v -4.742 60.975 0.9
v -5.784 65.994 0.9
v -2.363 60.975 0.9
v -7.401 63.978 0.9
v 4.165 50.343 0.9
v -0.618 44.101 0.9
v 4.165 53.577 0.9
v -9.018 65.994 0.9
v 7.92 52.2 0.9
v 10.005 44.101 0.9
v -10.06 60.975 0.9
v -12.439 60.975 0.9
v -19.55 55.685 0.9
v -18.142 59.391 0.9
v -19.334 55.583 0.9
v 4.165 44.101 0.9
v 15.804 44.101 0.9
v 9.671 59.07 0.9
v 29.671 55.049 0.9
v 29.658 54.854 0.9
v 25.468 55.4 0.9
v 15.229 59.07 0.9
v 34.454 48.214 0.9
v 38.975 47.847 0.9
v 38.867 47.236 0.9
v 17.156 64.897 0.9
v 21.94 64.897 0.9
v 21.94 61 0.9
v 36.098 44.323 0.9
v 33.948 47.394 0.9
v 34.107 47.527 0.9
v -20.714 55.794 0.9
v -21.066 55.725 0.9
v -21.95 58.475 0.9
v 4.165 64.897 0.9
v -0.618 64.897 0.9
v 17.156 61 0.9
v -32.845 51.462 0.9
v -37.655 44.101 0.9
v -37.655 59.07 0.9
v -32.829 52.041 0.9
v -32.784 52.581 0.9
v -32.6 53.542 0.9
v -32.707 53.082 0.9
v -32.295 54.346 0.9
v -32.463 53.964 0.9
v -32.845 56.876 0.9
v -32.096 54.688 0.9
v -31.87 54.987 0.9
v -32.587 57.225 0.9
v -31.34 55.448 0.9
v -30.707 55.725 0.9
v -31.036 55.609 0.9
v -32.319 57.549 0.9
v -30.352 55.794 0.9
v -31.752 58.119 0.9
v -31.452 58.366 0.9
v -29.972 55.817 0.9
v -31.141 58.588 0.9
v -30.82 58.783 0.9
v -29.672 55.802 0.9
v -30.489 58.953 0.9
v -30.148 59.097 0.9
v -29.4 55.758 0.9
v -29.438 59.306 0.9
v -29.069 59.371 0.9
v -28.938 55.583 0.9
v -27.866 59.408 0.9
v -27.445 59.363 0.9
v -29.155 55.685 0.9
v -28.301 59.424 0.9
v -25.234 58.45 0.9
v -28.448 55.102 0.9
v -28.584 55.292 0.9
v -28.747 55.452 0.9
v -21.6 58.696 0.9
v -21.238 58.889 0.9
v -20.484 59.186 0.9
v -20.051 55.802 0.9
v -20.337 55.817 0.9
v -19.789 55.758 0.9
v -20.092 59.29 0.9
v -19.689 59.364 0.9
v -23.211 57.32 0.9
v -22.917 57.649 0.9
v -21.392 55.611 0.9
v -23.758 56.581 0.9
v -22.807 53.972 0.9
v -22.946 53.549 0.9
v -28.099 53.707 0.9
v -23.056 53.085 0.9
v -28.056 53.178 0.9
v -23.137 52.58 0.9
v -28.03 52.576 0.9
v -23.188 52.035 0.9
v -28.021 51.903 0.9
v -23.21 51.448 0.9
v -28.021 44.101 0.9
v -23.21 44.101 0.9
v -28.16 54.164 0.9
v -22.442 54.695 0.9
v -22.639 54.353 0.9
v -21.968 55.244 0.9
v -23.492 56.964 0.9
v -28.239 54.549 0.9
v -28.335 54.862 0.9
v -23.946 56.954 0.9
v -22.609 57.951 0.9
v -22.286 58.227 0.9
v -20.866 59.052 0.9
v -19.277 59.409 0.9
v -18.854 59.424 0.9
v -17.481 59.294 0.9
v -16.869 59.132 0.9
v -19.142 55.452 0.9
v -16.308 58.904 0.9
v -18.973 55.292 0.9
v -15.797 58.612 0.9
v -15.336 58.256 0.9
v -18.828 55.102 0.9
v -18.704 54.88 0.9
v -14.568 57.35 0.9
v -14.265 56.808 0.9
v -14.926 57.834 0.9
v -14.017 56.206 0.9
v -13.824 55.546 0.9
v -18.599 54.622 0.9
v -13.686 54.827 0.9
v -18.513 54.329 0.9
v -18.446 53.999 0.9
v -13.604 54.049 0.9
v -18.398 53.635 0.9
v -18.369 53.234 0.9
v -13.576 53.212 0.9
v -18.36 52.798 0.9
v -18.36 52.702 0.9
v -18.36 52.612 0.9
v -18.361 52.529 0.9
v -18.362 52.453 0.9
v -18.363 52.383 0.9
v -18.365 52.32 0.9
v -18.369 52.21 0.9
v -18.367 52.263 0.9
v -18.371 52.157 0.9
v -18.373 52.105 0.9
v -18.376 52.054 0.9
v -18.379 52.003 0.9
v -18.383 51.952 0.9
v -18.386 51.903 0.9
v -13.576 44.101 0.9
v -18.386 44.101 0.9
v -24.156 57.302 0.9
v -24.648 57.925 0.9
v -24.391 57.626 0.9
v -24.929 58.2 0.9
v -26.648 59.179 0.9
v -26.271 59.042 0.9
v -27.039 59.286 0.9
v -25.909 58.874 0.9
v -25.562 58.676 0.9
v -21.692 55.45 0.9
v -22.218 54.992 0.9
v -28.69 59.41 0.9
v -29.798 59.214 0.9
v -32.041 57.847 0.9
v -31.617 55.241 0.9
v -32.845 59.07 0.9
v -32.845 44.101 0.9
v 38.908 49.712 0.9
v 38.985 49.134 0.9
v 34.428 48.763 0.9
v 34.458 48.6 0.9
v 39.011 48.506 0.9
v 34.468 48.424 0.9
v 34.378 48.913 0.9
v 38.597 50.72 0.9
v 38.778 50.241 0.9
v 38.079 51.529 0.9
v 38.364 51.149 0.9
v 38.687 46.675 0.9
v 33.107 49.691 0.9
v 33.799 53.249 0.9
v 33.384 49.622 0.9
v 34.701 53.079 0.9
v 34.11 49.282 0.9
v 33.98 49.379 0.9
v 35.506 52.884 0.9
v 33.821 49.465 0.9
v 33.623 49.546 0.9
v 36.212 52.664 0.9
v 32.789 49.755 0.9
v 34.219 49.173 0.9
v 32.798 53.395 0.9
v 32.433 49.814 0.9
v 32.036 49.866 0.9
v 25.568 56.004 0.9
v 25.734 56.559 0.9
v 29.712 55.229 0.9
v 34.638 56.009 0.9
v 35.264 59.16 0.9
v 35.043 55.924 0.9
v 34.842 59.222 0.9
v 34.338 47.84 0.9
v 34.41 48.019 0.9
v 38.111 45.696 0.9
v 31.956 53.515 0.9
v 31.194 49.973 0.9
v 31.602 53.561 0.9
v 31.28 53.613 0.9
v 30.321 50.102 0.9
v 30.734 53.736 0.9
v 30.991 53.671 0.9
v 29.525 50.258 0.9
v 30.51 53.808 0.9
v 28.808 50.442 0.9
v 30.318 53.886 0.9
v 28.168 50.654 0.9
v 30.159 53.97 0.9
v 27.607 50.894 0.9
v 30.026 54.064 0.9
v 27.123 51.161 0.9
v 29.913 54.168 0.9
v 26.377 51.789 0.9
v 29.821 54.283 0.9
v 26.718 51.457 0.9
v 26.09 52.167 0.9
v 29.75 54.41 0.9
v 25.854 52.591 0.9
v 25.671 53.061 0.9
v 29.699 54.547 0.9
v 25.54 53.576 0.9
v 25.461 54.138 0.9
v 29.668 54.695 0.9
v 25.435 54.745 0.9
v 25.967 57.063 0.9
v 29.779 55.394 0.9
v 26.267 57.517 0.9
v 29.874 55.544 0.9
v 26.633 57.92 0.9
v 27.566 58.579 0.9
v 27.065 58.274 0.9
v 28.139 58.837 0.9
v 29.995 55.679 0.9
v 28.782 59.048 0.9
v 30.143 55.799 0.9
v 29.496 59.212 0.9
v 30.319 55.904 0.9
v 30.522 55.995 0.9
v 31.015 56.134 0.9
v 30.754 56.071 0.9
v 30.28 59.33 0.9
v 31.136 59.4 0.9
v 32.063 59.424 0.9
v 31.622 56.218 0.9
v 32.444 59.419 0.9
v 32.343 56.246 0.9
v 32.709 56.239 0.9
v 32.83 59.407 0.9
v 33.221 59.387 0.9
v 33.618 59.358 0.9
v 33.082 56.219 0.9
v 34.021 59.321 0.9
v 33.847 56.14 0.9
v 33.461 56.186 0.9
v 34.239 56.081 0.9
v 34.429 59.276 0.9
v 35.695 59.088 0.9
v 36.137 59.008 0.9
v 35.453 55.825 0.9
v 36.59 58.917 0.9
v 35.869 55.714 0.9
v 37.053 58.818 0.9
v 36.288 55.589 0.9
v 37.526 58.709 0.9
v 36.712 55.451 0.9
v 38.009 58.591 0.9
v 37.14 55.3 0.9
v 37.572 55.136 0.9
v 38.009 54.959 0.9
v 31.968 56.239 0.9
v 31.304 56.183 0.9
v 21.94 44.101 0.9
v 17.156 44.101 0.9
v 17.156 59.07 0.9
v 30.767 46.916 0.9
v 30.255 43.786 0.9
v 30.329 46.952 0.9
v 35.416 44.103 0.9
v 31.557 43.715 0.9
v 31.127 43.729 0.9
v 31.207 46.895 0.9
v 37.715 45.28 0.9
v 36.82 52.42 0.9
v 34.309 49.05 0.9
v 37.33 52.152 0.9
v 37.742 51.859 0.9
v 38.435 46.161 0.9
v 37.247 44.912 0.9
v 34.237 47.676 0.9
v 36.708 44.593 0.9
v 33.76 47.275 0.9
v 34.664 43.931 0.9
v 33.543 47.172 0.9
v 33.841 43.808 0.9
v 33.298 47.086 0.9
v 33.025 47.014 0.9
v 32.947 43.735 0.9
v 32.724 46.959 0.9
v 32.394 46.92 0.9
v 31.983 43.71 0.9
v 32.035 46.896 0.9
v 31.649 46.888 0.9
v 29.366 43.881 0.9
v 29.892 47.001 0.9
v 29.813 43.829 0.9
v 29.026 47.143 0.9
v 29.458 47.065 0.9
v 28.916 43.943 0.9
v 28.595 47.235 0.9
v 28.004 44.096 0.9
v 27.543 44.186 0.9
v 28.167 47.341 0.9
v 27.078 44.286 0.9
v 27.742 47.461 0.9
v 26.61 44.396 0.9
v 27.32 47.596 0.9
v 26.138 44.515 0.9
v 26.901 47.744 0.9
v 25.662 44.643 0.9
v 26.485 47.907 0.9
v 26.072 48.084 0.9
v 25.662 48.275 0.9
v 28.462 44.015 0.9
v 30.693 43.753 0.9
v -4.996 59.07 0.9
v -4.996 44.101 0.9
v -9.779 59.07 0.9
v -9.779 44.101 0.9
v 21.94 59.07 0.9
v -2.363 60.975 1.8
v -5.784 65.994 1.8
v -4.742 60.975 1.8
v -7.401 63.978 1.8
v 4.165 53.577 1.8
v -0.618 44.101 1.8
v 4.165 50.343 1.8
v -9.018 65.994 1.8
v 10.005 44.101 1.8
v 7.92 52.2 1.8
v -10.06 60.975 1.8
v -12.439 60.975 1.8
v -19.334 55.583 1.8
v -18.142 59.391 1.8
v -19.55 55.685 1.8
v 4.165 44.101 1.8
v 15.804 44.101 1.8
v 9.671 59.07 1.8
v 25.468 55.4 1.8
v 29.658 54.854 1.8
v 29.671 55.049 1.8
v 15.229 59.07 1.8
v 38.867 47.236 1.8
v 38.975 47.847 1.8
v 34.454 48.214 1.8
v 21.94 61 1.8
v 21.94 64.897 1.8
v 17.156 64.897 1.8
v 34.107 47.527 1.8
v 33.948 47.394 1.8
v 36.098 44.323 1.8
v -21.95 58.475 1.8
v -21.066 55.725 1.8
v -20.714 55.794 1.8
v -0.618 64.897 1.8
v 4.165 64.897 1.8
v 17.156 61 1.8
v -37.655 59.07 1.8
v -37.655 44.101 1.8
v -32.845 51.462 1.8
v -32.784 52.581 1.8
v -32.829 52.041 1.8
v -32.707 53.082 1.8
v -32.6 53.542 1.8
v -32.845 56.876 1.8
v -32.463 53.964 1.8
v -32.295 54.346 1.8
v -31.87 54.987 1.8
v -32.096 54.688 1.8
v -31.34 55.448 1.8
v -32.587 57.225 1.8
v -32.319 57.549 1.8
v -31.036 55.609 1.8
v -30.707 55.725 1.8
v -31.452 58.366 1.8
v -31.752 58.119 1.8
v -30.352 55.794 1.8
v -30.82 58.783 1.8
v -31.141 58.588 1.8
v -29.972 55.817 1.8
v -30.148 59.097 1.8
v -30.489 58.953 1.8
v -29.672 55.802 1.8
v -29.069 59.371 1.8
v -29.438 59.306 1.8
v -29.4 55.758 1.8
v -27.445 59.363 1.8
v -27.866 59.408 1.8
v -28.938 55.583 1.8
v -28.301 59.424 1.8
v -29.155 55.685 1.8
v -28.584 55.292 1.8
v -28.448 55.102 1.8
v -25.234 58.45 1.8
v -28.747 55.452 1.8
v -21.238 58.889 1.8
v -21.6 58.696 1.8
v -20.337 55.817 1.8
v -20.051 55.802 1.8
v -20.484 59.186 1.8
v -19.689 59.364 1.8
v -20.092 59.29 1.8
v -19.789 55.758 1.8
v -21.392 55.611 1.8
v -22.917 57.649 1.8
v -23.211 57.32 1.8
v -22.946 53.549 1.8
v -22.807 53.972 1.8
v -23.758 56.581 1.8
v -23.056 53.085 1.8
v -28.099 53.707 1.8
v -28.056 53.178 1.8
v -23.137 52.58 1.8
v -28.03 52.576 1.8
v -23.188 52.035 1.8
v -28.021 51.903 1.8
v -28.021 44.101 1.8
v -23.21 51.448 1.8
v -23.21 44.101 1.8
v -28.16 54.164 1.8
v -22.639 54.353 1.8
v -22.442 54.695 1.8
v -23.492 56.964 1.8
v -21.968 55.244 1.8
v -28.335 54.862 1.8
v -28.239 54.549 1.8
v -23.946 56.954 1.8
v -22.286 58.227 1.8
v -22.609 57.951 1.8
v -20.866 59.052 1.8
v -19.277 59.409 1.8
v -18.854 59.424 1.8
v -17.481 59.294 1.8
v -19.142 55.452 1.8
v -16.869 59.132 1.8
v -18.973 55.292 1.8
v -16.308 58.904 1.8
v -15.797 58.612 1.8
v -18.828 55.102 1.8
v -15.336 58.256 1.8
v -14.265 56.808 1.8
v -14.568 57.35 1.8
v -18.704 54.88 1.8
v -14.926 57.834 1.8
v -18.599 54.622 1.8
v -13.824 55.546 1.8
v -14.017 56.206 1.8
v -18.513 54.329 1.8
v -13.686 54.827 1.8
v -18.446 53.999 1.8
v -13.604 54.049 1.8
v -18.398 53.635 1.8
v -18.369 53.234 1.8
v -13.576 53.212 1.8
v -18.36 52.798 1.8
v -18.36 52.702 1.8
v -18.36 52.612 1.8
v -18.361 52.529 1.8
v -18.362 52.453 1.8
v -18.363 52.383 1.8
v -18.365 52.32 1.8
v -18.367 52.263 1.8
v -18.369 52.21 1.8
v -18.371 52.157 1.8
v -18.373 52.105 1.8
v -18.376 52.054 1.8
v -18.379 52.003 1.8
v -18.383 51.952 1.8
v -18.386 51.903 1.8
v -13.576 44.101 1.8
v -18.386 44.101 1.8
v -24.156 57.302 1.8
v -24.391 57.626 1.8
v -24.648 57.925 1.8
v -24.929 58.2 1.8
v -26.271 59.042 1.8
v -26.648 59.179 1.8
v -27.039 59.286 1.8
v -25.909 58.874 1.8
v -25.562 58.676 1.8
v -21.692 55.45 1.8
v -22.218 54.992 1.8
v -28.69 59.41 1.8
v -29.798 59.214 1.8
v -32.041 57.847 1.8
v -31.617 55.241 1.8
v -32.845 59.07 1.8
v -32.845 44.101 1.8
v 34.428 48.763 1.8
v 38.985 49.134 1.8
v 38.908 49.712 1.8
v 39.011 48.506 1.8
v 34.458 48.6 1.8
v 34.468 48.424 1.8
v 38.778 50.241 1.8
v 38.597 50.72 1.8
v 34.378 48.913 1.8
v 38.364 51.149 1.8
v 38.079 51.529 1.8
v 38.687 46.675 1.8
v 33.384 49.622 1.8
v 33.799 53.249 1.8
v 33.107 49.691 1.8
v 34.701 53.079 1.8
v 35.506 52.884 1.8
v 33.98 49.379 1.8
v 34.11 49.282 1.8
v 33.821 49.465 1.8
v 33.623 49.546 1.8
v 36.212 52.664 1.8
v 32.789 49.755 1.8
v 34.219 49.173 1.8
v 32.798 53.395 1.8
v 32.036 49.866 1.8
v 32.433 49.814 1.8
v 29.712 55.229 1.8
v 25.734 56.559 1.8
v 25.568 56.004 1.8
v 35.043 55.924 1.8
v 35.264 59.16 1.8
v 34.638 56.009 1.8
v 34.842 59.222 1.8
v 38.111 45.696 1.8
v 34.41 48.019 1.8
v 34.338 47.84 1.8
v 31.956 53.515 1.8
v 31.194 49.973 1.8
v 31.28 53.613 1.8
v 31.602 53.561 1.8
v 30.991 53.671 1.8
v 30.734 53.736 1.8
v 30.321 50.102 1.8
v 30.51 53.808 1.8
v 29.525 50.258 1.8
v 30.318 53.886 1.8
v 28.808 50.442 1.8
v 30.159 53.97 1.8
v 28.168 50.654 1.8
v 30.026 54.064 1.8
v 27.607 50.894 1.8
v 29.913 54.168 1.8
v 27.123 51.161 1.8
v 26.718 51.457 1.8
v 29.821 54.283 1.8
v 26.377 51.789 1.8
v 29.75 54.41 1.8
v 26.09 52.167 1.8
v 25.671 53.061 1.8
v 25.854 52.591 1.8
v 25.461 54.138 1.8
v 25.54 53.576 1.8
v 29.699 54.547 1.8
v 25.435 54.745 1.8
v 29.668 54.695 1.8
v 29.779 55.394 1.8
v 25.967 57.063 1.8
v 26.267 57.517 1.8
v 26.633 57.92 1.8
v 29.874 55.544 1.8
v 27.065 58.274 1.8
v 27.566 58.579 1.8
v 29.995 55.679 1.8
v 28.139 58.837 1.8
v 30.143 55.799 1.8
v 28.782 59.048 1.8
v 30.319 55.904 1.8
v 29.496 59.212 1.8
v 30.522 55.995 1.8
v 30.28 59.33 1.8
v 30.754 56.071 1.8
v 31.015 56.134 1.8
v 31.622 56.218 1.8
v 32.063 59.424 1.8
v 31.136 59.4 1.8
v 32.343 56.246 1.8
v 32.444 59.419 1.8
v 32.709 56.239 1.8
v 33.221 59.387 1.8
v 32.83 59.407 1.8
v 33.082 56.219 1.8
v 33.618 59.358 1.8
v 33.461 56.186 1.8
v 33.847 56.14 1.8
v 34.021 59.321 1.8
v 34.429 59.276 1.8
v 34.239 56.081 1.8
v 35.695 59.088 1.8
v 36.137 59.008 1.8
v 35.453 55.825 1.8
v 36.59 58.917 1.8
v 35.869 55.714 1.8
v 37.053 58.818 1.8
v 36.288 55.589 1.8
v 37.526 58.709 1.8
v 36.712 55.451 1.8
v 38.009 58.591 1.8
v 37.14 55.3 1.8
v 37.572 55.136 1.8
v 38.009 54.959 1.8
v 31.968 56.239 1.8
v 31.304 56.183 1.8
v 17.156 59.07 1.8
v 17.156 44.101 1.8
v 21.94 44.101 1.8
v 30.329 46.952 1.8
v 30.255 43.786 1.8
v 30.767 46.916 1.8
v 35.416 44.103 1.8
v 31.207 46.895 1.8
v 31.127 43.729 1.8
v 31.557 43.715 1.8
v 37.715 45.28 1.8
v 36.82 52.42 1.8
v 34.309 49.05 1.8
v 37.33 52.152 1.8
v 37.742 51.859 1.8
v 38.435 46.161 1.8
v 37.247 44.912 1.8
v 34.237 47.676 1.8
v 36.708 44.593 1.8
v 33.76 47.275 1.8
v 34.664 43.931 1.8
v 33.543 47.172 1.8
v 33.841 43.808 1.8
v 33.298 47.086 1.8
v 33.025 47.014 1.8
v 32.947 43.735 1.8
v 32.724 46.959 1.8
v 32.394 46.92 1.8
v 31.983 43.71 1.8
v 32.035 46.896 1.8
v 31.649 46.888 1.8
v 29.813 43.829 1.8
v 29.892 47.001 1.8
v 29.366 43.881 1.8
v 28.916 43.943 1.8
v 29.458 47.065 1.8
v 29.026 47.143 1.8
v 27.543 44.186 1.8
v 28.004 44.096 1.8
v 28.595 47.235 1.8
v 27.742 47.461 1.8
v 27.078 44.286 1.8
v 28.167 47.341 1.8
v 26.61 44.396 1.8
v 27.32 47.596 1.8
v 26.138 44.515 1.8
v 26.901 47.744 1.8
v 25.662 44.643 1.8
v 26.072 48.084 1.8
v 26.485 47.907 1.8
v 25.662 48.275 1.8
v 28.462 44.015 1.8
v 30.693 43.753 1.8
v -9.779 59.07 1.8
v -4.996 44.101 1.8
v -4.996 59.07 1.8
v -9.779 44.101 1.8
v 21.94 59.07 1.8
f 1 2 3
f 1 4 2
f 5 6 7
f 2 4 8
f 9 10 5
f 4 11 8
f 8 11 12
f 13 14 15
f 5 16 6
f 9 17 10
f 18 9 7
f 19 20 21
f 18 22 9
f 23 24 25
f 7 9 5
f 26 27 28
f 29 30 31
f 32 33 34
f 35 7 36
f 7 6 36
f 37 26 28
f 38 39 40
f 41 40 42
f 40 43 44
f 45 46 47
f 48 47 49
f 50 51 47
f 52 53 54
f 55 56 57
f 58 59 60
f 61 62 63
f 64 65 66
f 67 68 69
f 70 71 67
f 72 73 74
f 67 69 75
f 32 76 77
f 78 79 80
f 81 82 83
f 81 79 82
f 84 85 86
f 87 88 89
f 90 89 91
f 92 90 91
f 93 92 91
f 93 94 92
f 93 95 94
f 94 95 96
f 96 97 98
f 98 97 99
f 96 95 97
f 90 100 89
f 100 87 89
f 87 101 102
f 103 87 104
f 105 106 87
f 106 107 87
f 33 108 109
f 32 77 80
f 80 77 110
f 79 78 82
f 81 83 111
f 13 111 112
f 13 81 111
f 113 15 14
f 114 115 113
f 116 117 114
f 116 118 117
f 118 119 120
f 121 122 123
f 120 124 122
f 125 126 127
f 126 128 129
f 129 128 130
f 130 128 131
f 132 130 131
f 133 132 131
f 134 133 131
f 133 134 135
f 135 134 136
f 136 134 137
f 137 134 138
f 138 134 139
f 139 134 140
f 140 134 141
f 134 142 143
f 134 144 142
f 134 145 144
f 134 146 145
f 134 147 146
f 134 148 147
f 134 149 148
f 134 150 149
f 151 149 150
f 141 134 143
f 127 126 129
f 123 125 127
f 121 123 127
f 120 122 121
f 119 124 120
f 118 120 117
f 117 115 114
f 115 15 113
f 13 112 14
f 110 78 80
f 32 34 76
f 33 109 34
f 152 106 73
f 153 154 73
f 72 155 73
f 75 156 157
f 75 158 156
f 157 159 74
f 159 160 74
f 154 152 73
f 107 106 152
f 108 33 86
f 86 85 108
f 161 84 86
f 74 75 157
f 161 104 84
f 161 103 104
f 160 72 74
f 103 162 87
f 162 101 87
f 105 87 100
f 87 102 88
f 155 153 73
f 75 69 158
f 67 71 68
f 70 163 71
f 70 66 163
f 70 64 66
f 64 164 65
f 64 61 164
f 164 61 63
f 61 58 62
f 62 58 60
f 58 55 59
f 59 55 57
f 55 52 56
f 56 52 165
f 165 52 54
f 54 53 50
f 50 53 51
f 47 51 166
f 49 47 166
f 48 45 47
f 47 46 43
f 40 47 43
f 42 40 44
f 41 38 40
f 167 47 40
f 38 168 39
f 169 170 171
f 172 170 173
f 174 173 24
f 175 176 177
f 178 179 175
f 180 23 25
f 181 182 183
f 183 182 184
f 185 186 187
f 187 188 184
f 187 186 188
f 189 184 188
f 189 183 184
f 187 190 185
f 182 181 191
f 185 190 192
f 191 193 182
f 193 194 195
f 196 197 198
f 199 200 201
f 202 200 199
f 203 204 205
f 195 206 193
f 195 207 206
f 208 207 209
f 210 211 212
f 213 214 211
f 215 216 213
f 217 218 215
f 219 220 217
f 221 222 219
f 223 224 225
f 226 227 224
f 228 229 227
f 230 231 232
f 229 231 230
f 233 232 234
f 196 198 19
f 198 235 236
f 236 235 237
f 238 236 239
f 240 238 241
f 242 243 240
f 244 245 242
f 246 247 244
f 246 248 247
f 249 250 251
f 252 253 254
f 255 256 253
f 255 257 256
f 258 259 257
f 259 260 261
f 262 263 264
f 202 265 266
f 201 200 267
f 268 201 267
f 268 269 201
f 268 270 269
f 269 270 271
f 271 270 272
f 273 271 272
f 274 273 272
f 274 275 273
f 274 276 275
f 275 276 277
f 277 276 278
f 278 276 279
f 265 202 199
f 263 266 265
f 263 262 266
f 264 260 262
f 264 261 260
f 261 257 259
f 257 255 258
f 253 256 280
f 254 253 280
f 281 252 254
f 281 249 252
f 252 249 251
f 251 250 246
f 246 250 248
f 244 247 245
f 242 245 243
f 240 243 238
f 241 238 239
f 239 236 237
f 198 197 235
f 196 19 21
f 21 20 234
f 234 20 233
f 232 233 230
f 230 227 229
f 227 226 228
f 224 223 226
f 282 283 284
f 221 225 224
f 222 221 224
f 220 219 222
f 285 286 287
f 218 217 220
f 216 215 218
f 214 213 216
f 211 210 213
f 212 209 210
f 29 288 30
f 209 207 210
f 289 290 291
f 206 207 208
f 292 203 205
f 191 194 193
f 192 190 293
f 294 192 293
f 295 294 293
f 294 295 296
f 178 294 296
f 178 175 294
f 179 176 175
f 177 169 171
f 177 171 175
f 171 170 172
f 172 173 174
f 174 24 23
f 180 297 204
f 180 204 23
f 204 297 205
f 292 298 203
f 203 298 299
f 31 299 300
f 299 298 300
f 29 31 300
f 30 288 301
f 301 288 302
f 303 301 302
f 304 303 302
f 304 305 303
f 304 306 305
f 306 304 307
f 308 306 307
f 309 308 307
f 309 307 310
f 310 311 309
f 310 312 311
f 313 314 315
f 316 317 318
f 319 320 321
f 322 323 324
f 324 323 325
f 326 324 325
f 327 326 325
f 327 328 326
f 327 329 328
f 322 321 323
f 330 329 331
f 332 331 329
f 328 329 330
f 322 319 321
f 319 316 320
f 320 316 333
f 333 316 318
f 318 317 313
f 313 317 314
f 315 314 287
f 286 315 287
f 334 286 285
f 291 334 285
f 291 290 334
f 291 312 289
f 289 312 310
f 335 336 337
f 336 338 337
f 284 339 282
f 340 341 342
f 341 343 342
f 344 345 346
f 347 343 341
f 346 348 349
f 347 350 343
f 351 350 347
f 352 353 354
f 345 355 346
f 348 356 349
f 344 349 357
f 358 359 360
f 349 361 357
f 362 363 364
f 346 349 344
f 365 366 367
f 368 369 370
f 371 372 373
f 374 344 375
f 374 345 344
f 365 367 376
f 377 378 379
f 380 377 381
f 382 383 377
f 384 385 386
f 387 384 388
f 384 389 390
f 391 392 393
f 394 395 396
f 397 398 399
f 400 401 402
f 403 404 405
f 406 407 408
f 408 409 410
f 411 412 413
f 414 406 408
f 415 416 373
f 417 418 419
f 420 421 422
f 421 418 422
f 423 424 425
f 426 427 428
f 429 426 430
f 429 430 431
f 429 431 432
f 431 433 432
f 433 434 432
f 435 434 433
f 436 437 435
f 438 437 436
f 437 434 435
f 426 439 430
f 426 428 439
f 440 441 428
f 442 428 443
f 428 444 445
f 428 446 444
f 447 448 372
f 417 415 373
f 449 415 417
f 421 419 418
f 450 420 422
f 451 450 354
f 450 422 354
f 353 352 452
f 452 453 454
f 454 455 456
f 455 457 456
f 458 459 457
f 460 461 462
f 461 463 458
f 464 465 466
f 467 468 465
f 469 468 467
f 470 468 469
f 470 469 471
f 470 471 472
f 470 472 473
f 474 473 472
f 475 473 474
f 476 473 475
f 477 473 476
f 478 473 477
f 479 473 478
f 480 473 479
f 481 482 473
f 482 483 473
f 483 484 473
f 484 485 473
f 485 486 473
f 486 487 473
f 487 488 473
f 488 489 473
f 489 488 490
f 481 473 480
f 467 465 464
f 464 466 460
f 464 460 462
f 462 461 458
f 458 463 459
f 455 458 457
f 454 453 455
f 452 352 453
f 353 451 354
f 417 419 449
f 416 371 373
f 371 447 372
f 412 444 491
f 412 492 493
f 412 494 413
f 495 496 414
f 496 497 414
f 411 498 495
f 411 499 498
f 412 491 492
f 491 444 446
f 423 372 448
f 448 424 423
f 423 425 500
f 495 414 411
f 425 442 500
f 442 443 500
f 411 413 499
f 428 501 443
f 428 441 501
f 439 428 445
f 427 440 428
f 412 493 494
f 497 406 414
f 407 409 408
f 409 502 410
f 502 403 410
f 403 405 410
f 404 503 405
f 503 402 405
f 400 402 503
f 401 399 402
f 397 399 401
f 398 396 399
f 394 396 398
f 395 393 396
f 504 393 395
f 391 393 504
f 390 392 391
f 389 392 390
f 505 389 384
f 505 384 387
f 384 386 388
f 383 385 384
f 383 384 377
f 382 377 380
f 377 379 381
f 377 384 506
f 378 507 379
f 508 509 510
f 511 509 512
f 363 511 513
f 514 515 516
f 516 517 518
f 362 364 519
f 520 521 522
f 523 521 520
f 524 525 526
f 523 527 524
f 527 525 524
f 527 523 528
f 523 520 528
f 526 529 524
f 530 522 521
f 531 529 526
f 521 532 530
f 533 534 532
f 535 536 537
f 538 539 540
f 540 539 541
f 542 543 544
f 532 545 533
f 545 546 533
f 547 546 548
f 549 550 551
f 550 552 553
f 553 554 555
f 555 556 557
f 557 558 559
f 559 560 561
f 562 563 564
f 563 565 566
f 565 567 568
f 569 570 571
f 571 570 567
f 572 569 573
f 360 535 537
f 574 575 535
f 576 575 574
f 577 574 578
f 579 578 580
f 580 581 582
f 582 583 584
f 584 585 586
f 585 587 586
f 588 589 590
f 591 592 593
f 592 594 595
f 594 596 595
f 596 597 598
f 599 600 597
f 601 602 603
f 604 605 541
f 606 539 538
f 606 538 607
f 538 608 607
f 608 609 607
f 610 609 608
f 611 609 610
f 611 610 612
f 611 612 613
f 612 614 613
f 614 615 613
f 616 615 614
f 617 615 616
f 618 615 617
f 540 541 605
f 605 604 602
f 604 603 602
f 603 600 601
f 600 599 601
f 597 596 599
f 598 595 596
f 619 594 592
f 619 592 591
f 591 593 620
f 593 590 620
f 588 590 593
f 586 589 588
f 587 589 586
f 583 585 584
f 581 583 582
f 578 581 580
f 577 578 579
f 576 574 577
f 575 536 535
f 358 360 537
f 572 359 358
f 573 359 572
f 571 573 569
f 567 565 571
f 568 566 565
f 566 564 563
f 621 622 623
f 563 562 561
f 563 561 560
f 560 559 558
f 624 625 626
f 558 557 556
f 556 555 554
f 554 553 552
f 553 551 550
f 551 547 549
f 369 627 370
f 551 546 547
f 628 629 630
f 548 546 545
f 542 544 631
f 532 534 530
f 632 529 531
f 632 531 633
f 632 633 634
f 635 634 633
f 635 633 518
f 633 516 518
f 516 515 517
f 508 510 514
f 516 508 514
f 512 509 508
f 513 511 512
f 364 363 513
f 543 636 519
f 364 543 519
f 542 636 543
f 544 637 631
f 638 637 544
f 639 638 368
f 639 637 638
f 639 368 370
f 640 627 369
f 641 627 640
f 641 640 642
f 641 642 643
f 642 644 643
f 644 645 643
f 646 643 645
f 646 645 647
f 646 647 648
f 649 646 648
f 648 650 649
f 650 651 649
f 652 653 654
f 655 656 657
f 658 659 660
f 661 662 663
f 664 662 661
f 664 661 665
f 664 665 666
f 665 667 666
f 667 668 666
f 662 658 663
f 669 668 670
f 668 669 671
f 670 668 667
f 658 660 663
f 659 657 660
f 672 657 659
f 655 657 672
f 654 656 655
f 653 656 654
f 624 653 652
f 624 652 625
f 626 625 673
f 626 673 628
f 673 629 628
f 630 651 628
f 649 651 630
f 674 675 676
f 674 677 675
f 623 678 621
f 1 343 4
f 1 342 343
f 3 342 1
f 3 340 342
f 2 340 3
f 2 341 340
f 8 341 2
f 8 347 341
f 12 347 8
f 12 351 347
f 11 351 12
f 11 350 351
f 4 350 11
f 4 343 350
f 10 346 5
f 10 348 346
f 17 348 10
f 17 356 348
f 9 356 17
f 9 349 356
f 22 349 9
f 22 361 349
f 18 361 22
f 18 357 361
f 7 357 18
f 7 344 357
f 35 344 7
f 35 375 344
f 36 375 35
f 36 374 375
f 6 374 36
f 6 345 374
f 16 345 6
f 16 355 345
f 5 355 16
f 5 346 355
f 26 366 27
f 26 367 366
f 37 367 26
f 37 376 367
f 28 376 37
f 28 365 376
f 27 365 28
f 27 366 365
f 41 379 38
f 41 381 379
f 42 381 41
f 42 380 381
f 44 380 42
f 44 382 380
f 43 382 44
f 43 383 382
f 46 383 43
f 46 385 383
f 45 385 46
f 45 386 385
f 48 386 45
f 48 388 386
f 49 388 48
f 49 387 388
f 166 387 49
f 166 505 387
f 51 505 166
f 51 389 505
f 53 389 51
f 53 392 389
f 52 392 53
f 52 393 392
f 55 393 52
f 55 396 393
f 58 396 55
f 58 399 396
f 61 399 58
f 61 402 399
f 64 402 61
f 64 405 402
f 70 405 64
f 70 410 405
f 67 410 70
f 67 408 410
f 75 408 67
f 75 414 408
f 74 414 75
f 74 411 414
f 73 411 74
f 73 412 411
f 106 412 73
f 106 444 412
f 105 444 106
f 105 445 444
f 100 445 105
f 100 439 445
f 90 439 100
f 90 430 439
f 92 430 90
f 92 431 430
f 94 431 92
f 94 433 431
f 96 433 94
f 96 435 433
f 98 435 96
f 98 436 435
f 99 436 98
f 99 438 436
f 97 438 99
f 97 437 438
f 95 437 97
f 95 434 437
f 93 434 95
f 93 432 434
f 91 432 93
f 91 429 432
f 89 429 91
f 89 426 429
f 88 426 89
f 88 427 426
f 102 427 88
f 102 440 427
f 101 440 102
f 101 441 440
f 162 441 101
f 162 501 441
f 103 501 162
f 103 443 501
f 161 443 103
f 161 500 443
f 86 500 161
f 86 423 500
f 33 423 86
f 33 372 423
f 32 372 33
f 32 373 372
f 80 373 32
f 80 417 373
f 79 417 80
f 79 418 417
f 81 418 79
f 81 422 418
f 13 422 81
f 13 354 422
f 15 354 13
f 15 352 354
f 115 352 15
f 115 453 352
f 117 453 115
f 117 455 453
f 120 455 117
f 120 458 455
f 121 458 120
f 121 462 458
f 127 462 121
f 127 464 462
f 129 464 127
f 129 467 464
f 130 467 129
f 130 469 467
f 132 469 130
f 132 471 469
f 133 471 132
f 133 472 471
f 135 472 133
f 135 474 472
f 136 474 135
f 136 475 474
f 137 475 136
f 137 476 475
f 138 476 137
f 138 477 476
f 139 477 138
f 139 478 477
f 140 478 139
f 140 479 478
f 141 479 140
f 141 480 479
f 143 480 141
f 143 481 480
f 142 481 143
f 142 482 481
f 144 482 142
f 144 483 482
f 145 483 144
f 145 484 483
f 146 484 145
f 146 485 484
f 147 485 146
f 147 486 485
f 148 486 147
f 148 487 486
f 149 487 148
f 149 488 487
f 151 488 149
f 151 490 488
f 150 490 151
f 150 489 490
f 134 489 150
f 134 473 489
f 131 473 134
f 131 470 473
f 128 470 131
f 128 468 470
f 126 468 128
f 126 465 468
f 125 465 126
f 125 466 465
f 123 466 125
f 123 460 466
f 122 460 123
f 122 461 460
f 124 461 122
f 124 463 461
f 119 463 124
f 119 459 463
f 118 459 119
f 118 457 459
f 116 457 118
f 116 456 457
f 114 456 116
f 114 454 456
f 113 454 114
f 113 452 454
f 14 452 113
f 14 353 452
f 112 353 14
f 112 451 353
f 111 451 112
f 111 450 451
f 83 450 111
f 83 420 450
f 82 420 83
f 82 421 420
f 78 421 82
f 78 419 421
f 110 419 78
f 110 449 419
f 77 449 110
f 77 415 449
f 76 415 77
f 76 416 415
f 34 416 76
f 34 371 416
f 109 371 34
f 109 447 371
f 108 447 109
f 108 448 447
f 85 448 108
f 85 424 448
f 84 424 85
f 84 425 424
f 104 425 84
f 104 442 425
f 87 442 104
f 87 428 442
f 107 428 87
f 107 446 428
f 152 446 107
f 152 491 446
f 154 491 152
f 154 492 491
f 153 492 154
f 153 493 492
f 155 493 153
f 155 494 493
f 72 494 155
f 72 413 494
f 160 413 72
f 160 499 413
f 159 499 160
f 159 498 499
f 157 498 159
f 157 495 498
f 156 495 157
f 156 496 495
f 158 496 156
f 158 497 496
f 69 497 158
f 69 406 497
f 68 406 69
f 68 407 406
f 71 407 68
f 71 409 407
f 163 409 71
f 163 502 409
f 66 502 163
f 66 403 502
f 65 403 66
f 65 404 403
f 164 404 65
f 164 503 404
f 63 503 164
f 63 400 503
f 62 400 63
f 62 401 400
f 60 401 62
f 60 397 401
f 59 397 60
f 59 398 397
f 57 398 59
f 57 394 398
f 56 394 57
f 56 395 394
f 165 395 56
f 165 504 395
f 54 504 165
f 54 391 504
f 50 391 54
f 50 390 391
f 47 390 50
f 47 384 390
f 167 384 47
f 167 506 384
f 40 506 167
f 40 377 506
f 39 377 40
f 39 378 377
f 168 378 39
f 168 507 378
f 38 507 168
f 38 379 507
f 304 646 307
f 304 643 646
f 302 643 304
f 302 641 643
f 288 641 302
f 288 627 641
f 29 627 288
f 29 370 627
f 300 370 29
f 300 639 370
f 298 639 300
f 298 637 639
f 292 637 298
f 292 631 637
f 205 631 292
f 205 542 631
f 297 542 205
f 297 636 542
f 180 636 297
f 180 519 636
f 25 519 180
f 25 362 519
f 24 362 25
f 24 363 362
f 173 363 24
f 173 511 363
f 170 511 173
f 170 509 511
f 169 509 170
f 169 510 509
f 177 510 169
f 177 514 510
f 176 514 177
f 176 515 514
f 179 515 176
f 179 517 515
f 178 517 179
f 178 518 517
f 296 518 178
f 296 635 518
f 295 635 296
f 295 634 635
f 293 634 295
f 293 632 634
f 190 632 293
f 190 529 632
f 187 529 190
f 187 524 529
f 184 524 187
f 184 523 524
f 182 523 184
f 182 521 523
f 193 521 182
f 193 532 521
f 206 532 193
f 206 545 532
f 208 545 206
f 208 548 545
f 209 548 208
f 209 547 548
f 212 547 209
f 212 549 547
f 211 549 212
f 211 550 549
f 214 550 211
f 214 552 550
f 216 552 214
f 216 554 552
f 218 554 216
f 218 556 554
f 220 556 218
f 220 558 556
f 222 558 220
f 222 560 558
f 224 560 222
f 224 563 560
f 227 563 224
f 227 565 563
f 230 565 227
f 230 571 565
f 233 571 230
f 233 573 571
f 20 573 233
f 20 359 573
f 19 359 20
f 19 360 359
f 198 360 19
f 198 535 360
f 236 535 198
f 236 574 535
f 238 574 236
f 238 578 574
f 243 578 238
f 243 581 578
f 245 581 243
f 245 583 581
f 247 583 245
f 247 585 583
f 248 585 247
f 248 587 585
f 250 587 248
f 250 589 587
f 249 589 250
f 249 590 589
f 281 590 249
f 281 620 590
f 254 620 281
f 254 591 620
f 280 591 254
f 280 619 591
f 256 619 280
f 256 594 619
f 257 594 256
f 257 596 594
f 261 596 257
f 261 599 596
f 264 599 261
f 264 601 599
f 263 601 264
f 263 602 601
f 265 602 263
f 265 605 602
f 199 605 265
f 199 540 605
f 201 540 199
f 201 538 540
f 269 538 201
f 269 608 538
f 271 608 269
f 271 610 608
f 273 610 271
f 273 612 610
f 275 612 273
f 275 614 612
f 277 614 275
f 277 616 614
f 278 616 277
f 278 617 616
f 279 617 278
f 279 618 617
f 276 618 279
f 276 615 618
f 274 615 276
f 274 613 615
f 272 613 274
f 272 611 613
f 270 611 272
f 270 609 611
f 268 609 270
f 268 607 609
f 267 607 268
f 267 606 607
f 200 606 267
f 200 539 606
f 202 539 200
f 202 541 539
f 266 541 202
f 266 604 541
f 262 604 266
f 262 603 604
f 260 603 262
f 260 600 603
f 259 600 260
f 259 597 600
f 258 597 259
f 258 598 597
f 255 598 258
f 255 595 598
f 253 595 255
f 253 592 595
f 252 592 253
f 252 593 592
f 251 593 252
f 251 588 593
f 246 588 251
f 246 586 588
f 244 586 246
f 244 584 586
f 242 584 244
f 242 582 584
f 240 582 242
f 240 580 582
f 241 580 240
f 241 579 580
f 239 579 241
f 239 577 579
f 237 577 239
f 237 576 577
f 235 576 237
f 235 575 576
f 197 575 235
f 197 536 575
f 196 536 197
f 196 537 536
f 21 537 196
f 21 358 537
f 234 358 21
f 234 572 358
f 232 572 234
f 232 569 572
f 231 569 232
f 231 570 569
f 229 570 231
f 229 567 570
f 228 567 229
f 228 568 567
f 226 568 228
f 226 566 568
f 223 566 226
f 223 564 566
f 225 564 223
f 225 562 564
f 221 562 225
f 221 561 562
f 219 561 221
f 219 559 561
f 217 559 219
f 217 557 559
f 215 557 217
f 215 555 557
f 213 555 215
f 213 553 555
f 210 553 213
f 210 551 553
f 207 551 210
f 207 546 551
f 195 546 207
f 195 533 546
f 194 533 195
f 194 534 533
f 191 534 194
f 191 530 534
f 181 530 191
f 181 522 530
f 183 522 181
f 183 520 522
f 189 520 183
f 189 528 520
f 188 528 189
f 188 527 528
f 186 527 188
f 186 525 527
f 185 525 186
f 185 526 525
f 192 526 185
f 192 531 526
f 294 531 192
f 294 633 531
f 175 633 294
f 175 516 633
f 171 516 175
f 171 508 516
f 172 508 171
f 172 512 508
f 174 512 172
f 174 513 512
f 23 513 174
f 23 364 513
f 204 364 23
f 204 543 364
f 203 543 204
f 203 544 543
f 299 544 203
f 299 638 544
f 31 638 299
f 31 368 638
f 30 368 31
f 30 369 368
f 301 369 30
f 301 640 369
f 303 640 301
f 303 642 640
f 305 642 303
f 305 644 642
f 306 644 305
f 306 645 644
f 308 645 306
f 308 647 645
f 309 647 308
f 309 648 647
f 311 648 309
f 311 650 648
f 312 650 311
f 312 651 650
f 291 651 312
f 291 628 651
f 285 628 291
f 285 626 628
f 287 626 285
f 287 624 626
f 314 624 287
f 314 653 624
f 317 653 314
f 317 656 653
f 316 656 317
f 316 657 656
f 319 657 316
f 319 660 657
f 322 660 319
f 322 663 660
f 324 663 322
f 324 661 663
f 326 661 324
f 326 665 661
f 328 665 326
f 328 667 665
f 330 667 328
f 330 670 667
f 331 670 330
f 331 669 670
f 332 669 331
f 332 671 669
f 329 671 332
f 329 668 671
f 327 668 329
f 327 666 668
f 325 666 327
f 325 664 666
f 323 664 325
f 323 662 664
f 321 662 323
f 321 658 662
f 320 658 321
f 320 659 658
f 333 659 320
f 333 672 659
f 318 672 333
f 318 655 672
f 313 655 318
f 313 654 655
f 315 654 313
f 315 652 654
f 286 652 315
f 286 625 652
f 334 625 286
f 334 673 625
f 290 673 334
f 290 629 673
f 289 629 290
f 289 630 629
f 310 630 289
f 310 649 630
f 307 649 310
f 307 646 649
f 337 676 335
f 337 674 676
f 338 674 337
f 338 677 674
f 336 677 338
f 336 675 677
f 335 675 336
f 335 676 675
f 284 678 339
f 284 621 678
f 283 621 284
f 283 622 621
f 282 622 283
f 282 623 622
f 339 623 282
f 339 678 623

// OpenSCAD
$fn = 48;
  // transliteration (above top hole)
  translate([0, 54.600, 0.900]) linear_extrude(height=0.900) text("mîkis", size=19.705, halign="center", valign="center", font="Helvetica Neue:style=Bold");
